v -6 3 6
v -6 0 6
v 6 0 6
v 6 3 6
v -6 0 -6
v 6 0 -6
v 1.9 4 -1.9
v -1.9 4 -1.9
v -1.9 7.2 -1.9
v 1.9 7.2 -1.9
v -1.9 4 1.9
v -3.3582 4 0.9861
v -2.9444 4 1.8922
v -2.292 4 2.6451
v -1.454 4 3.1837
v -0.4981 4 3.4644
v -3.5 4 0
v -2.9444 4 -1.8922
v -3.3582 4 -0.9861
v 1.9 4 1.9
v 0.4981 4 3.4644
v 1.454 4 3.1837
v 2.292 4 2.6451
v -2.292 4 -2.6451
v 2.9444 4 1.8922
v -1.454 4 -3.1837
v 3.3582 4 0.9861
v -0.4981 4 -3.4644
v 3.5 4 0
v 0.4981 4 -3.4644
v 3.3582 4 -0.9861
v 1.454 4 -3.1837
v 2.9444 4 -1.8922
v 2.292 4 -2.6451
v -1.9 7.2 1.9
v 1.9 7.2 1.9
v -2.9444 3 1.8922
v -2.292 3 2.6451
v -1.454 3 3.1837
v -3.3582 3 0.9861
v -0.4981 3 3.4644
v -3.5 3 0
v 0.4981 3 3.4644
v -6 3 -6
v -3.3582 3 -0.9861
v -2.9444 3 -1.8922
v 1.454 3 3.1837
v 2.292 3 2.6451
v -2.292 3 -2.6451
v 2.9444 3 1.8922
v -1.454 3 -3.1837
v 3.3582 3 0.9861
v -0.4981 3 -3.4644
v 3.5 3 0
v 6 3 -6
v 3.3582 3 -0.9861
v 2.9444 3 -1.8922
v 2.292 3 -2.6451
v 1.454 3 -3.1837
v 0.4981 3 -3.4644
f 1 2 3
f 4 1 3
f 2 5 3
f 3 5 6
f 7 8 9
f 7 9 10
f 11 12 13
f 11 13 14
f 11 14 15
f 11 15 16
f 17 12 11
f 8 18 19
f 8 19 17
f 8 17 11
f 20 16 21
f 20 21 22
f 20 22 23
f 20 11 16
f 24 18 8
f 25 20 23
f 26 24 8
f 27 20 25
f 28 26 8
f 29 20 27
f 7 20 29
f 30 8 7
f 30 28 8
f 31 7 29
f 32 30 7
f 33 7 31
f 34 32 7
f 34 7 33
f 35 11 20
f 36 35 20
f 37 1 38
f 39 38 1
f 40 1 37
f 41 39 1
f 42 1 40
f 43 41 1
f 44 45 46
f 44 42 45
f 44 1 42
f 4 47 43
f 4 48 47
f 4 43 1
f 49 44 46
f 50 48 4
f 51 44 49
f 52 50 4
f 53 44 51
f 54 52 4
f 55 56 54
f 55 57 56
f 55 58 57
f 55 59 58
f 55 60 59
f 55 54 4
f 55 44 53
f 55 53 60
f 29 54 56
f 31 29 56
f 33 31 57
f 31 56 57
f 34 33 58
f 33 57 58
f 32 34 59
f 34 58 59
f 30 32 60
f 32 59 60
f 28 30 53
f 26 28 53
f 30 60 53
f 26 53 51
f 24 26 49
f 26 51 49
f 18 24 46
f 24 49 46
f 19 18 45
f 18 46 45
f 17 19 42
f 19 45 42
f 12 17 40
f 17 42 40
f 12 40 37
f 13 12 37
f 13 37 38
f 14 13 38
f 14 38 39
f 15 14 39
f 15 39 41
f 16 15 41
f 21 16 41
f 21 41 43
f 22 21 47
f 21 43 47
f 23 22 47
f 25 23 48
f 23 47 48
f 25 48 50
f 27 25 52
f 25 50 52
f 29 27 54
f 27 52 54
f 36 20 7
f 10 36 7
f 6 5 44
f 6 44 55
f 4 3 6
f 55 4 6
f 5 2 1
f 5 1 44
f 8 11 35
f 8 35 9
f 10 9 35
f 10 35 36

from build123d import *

# Parameters (mm, degrees)
SKETCH1_W           = 12
SKETCH1_H           = 12
BOSS_EXTRUDE1_DEPTH = 3
SKETCH3_R           = 3.5
BOSS_EXTRUDE2_DEPTH = 1
SKETCH4_W           = 3.8
SKETCH4_H           = 3.8
BOSS_EXTRUDE3_DEPTH = 3.2


with BuildPart() as part:
    # Sketch1 → Boss-Extrude1 (new body)
    with BuildSketch(Plane(origin=(0, 0, 0), x_dir=(1, 0, 0), z_dir=(0, 1, 0))):
        Rectangle(SKETCH1_W, SKETCH1_H)
    extrude(amount=BOSS_EXTRUDE1_DEPTH)

    # Sketch3 → Boss-Extrude2 (add)
    with BuildSketch(Plane(origin=(0, 3, 0), x_dir=(1, 0, 0), z_dir=(0, 1, 0))):
        Circle(SKETCH3_R)
    extrude(amount=BOSS_EXTRUDE2_DEPTH)

    # Sketch4 → Boss-Extrude3 (add)
    with BuildSketch(Plane(origin=(0, 4, 0), x_dir=(1, 0, 0), z_dir=(0, 1, 0))):
        Rectangle(SKETCH4_W, SKETCH4_H)
    extrude(amount=BOSS_EXTRUDE3_DEPTH)


solid = part.part
